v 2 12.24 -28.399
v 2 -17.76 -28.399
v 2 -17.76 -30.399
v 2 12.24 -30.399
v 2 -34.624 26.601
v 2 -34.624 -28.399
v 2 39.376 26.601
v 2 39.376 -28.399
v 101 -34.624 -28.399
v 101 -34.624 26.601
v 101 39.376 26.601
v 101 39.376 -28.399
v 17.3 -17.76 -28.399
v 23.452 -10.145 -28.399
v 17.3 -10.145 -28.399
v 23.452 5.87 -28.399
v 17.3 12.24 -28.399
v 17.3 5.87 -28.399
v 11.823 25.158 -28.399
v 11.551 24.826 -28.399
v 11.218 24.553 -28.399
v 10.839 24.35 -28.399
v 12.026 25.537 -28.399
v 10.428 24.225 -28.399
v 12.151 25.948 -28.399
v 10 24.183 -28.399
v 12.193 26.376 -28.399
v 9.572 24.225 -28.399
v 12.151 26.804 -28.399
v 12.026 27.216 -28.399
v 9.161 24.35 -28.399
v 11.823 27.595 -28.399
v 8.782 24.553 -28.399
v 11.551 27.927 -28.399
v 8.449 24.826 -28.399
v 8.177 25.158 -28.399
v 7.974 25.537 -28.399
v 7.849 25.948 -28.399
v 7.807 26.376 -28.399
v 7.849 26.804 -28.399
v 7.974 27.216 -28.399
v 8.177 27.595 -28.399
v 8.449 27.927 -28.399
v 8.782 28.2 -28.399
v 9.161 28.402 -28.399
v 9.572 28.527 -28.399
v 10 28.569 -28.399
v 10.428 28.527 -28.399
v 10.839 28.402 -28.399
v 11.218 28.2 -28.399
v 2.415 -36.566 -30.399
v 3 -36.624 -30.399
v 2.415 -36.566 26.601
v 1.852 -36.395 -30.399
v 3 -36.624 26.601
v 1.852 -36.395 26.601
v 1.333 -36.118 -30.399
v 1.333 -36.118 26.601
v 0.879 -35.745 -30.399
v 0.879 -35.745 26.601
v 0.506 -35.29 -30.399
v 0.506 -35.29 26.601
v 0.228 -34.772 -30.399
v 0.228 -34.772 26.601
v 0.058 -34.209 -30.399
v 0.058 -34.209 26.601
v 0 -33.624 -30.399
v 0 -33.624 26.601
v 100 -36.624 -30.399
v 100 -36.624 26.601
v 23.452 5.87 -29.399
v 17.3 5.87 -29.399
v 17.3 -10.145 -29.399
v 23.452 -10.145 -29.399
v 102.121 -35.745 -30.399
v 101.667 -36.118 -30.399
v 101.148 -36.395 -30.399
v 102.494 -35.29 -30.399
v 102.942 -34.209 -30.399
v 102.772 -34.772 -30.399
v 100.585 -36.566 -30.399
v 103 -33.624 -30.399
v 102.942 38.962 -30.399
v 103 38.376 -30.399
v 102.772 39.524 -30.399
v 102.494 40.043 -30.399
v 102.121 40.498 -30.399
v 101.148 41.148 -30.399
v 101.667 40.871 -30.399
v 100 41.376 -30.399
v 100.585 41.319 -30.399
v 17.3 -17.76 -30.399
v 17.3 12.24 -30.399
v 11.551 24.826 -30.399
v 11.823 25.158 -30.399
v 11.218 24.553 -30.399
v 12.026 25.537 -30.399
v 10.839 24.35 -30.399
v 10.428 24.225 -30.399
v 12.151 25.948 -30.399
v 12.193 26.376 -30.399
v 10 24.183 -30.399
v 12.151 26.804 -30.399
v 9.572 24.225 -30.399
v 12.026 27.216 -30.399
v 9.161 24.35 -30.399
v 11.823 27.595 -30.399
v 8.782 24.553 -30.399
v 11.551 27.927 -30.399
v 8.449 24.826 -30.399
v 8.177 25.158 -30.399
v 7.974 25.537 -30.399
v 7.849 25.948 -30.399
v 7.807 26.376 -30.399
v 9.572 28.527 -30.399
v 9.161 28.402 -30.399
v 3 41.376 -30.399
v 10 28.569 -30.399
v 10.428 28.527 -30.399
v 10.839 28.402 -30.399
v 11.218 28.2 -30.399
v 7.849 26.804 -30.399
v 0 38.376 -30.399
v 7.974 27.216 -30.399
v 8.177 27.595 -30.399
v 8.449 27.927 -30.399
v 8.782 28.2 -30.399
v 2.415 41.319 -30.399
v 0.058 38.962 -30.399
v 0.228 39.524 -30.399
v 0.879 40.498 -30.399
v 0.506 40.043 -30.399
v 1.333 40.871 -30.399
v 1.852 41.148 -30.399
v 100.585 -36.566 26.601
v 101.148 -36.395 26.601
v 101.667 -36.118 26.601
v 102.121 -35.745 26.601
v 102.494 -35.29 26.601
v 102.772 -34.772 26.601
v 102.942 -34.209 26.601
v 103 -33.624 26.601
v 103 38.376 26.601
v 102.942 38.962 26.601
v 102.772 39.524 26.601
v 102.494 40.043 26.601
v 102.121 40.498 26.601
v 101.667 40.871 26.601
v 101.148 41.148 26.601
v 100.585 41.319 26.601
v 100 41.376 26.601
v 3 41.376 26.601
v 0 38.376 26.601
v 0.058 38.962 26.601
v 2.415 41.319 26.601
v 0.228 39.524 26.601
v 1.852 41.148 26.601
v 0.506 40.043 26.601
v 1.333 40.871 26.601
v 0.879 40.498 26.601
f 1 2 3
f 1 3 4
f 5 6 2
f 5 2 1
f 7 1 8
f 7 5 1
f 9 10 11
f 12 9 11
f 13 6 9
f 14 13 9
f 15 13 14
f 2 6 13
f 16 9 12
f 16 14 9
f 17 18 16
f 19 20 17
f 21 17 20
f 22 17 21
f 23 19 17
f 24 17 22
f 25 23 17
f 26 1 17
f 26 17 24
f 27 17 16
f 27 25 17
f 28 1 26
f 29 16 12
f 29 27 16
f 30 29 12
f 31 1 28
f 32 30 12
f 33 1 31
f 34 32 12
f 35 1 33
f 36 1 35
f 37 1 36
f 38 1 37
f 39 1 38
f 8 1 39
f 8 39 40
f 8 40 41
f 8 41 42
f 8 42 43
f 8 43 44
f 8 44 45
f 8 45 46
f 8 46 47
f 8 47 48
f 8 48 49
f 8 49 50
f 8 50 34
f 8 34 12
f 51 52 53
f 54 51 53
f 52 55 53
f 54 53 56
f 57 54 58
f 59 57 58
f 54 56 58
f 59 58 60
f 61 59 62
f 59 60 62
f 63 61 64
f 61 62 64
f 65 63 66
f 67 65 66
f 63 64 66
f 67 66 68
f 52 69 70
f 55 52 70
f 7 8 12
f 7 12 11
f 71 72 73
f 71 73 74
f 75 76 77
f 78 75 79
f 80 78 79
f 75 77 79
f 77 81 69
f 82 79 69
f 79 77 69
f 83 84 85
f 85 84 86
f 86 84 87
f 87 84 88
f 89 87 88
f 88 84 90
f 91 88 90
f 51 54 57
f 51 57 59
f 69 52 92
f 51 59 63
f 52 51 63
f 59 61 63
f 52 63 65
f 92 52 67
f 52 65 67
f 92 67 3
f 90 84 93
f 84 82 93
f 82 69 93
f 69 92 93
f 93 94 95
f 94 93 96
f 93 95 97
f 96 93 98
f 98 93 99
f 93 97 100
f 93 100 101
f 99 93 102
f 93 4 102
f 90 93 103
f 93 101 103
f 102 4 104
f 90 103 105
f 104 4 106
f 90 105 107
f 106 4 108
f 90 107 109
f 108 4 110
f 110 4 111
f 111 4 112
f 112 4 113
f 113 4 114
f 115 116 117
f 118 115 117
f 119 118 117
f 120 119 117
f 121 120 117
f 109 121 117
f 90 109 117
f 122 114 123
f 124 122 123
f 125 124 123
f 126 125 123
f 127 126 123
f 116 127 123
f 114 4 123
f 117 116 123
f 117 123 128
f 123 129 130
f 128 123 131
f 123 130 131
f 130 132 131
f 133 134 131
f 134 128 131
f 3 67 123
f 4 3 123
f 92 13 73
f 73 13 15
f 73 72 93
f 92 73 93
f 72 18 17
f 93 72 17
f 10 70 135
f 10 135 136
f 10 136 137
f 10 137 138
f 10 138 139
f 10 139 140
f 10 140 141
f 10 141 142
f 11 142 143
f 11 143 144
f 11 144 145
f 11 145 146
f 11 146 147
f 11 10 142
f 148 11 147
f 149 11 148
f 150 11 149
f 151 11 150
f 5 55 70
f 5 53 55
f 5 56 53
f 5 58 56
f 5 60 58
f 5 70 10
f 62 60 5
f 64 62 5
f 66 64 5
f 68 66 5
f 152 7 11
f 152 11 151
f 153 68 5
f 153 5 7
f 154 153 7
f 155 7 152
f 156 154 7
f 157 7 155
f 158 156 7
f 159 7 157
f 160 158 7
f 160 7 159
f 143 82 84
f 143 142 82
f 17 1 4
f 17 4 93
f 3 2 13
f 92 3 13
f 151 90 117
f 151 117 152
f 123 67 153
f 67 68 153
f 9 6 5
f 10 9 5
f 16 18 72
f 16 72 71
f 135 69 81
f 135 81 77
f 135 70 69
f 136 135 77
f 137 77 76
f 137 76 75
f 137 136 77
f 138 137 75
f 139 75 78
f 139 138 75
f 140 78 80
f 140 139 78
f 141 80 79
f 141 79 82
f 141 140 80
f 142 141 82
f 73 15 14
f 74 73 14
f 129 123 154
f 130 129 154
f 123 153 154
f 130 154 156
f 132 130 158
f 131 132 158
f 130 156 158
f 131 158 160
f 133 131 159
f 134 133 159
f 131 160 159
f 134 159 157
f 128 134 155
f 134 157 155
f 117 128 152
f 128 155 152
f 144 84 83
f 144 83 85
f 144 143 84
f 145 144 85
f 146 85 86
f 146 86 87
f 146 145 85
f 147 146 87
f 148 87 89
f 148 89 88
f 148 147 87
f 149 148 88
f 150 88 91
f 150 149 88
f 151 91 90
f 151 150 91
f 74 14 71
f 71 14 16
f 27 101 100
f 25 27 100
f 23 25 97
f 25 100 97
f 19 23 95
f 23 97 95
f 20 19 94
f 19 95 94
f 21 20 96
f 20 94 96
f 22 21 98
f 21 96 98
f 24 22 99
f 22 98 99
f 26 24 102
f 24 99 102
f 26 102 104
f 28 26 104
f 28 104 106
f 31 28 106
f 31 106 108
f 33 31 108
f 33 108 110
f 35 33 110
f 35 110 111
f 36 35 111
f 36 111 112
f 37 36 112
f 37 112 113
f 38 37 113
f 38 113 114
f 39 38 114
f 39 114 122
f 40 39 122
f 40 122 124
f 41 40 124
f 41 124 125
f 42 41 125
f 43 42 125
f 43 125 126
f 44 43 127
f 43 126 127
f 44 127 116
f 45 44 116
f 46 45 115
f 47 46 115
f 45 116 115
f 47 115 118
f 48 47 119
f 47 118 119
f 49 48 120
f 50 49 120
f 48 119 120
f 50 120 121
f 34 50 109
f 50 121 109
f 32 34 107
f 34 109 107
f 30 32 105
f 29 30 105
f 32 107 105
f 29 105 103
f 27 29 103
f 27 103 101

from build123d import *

# Parameters (mm, degrees)
F0_W     = 78
F0_H     = 57
F1_DEPTH = 103
F2_T     = -2
F3_W     = 15.3
F3_H     = 30
F4_DEPTH = 2
F5_W     = 6.151636
F5_H     = 16.015052
F6_DEPTH = 1
F7_R     = 3
F8_R     = 2.19301
F9_DEPTH = 25


with BuildPart() as f1:
    # F0 (on Right) → F1 (new body)
    with BuildSketch(Plane.YZ):
        with Locations((2.376287, -1.899485)):
            Rectangle(F0_W, F0_H)
    extrude(amount=F1_DEPTH)

    # F2
    f2_openings = [f1.faces().sort_by_distance(p)[0] for p in [
        (51.5, 2.376287, 26.600515),
    ]]
    offset(amount=F2_T, openings=f2_openings)

    # F3 (on face) → F4 (cut)
    with BuildSketch(Plane.XY.offset(-28.399485)):
        with Locations((9.65, -2.759746)):
            Rectangle(F3_W, F3_H)
    extrude(amount=-F4_DEPTH, mode=Mode.SUBTRACT)

    # F5 (on face) → F6 (cut)
    with BuildSketch(Plane.XY.offset(-28.399485)):
        with Locations((20.375818, -2.137607)):
            Rectangle(F5_W, F5_H)
    extrude(amount=-F6_DEPTH, mode=Mode.SUBTRACT)

    # F7
    f7_edges = [f1.edges().sort_by_distance(p)[0] for p in [
        (0, -36.623713, -1.899485),
        (0, 41.376287, -1.899485),
        (103, 41.376287, -1.899485),
        (103, -36.623713, -1.899485),
    ]]
    fillet(f7_edges, radius=F7_R)

    # F8 (on face) → F9 (cut)
    with BuildSketch(Plane(origin=(0, 0, -30.399485), x_dir=(1, 0, 0), z_dir=(0, 0, -1))):
        with Locations((10, -26.376287)):
            Circle(F8_R)
    extrude(amount=-F9_DEPTH, mode=Mode.SUBTRACT)


solid = f1.part
